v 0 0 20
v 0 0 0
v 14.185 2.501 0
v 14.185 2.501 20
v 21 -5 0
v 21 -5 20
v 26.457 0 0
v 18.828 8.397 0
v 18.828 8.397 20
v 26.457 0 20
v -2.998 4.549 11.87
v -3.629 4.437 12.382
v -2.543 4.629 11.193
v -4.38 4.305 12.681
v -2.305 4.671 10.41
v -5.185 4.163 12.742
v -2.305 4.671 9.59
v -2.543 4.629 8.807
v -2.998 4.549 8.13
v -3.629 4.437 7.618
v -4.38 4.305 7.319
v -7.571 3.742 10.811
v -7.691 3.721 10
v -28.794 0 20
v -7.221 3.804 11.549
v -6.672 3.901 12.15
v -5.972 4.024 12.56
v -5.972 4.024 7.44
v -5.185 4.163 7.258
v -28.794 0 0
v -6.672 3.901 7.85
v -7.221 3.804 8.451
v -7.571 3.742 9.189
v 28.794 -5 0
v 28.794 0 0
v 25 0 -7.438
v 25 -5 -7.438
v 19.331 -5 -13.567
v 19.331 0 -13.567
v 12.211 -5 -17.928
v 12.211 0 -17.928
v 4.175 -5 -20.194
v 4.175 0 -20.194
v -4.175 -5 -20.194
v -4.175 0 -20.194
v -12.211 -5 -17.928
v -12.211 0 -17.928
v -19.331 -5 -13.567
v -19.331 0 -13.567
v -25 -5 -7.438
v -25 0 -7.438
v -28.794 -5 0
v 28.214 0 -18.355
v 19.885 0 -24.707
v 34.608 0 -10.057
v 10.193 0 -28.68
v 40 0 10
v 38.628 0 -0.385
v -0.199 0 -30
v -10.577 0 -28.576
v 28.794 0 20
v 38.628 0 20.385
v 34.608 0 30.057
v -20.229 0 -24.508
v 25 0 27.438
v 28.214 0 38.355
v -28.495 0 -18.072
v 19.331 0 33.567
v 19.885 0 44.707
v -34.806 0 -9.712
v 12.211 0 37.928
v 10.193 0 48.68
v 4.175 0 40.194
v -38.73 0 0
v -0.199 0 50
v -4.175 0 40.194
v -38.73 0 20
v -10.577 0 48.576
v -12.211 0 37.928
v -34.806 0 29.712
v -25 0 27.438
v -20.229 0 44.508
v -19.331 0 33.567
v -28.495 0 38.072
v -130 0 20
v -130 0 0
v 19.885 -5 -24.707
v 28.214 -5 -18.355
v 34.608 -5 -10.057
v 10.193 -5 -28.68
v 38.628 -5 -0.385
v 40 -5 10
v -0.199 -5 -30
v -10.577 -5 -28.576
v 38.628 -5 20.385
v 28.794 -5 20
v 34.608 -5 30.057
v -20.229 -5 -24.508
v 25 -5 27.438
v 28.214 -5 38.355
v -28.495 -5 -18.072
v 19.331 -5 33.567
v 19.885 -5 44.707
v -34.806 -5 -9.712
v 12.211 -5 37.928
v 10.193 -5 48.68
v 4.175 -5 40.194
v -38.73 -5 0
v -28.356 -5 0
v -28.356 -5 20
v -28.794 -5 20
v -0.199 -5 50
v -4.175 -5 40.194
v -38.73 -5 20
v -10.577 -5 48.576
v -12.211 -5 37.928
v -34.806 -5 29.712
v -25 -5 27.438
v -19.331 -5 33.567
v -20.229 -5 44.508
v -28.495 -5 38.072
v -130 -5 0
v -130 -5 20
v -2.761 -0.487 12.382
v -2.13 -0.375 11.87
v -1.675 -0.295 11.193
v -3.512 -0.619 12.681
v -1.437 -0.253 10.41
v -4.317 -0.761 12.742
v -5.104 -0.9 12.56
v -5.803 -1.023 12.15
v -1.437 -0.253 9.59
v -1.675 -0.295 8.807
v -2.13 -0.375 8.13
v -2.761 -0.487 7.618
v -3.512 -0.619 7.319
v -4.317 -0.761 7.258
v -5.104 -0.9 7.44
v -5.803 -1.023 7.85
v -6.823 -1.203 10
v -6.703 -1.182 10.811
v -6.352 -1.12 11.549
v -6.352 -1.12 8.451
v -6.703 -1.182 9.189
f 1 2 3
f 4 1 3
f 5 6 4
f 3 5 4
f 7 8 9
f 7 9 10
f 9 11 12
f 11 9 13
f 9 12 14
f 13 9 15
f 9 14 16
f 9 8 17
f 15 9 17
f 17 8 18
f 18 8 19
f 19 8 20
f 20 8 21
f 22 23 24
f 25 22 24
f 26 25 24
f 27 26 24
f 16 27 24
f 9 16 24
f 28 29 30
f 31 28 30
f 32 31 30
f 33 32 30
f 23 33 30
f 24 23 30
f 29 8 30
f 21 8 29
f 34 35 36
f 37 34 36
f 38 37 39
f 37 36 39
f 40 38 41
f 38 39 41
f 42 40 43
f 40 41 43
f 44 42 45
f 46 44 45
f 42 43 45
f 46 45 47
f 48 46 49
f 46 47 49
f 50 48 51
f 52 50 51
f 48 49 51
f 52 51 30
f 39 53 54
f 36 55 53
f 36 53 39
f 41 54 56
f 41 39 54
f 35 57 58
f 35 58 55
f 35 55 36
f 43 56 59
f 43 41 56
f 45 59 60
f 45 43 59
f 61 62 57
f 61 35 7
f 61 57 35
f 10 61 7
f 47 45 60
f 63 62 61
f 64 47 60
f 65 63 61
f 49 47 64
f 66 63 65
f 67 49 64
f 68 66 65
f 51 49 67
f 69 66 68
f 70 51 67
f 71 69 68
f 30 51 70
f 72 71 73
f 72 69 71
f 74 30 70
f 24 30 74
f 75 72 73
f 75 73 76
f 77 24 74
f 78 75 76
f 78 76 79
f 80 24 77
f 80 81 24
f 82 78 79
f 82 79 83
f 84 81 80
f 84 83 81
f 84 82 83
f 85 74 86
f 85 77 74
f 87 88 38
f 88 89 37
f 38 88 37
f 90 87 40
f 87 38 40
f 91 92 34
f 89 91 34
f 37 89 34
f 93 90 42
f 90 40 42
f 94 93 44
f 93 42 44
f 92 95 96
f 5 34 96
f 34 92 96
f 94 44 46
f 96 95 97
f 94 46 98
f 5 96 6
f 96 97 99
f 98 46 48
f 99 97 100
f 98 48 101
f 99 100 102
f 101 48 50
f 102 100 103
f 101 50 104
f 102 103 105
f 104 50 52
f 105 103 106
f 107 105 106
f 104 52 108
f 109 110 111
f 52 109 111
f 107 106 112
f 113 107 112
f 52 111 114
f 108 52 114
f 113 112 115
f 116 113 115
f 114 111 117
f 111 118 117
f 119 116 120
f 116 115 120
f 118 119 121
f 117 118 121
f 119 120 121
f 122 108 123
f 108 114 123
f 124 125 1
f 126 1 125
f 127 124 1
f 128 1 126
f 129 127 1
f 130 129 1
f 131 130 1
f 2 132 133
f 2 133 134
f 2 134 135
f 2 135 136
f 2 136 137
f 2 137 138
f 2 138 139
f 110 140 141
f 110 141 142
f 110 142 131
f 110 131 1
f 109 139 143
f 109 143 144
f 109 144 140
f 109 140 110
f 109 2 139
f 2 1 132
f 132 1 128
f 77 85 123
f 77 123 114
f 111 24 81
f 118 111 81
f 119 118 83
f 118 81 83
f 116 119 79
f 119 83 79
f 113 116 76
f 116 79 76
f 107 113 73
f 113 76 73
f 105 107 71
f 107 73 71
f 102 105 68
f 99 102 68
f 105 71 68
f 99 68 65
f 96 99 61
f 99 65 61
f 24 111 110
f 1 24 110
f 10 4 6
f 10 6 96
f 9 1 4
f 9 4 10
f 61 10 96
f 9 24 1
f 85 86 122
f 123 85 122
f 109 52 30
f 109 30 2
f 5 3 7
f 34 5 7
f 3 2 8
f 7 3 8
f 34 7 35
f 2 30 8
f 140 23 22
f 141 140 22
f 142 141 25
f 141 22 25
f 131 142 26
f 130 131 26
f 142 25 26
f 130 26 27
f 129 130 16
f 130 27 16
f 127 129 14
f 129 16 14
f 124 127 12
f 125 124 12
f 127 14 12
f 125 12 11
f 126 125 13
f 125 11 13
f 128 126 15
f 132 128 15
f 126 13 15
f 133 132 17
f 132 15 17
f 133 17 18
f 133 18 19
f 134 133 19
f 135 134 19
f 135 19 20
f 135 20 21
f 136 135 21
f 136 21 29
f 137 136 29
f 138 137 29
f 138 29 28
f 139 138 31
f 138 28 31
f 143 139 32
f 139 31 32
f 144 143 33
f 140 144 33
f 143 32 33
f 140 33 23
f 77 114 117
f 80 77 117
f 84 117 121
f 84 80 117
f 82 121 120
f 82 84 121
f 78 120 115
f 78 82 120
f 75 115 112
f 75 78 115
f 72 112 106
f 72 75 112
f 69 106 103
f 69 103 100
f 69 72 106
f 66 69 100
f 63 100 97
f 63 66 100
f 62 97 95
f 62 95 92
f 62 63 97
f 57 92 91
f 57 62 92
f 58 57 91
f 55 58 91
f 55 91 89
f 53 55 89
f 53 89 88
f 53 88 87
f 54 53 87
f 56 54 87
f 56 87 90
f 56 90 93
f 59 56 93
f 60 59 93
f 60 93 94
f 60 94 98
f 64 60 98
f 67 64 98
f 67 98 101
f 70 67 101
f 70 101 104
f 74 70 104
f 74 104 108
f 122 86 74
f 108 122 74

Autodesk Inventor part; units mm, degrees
ref_plane "YZ Plane" through (0, 0, 0) normal (1, 0, 0) x (0, 1, 0)
ref_plane "XZ Plane" through (0, 0, 0) normal (0, 1, 0) x (-1, 0, 0)
ref_plane "XY Plane" through (0, 0, 0) normal (0, 0, 1) x (1, 0, 0)
sketch "Sketch1" plane through (0, 0, 0) normal (0, 0, 1) x (1, 0, 0)
  line L0 (0, 0) -> (-50, 0)
  line L1 (-50, 0) -> (-50, -5)
  line L2 (-50, -5) -> (0, -5)
  line L3 (0, -5) -> (0, 0)
  line L4 (0, 0) -> (19.6962, 3.473)
  line L5 (0, 0) -> (20, 0) construction
  line L6 (19.6962, 3.473) -> (18.8279, 8.397)
  line L7 (18.8279, 8.397) -> (-28.7939, 0)
  line L8 (0, 0) -> (-28.3564, -5)
  line L9 (0, 0) -> (28.7939, 0) construction
  line L10 (-50, 0) -> (-130, 0)
  line L11 (-130, 0) -> (-130, -5)
  line L12 (-130, -5) -> (-50, -5)
  line L13 (18.8279, 8.397) -> (31, -5)
  line L14 (31, -5) -> (21, -5)
  line L15 (21, -5) -> (10.5825, 6.4659)
  line L16 (31, -5) -> (31, 0)
  line L17 (31, 0) -> (26.4572, 0)
  line L18 (31, 0) -> (36, 0)
  line L19 (36, 0) -> (36, -5)
  line L20 (36, -5) -> (31, -5)
  line L21 (31, -5) -> (31, 0)
  point P0 (14.1847, 2.5011)
  point P1 (31, -5)
  dimension "d0" = 50
  dimension "d1" = 5
  dimension "d2" = 20
  dimension "d3" = 10
  dimension "d4" = 5
  dimension "d5" = 90
  dimension "d11" = 170
  dimension "d12" = 80
  dimension "d16" = 5
extrude "Extrusion1" add sketch "Sketch1" along normal blind 20 contours L8 L2 L1 L0 | L0 L7 L6 L4 | L4 L6 L13 L14 L15 | L1 L12 L11 L10 | L17 L16 L13 | L16 L18 L19 L20
sketch "Sketch2" plane through (-28.7939, 0, 0) normal (-0.1736, 0.9848, 0) x (-0.9848, -0.1736, 0)
  line L0 (-48.3564, 0) -> (0, 0) projected
  line L1 (0, 0) -> (0, 20) projected
  line L2 (-48.3564, 20) -> (0, 20) projected
  line L3 (-48.3564, 0) -> (-48.3564, 20) projected
  line L4 (-48.3564, 10) -> (0, 10)
  line L5 (-24.1782, 20) -> (-24.1782, 0)
  line L6 (-28.3564, 0) -> (-48.3564, 0) projected
  circle A0 centre (-24.1782, 10) radius 2.75
  dimension "d8" = 5.5
extrude "Extrusion2" cut sketch "Sketch2" against normal blind 20 contours A0 L5 L4 | L4 L5 A0 | L5 L4 A0 | L5 A0 L4
sketch "Sketch3" plane through (0, 0, 0) normal (0, 1, 0) x (-1, 0, 0)
  line L0 (130, 0) -> (28.3564, 0) projected
  line L1 (28.3564, 0) -> (28.3564, 20) projected
  line L2 (130, 20) -> (28.3564, 20) projected
  line L3 (130, 0) -> (130, 20) projected
  line L4 (-18.8279, 0) -> (28.7939, 0) projected
  line L5 (28.3564, 20) -> (28.7939, 0)
  line L6 (28.3564, 0) -> (28.3564, 20) projected
  line L7 (28.3564, 10) -> (-19.6962, 10)
  line L8 (-19.6962, 0) -> (-19.6962, 20) projected
  line L9 (28.7939, 0) -> (130, 0) projected
  circle A0 centre (0, 10) radius 30.4809
  circle A1 centre (0, 10) radius 40
  point P0 (0, 0)
  point P1 (38.7298, 20)
  point P2 (38.7298, 0)
  point P3 (28.7939, 20)
  dimension "d13" = 80
extrude "Extrusion3" add sketch "Sketch3" against normal blind 5 contours L0 A1 L2 A0 picked at (-11.3499, -24.8055)
properties part number "base mount for central centrifuge"
